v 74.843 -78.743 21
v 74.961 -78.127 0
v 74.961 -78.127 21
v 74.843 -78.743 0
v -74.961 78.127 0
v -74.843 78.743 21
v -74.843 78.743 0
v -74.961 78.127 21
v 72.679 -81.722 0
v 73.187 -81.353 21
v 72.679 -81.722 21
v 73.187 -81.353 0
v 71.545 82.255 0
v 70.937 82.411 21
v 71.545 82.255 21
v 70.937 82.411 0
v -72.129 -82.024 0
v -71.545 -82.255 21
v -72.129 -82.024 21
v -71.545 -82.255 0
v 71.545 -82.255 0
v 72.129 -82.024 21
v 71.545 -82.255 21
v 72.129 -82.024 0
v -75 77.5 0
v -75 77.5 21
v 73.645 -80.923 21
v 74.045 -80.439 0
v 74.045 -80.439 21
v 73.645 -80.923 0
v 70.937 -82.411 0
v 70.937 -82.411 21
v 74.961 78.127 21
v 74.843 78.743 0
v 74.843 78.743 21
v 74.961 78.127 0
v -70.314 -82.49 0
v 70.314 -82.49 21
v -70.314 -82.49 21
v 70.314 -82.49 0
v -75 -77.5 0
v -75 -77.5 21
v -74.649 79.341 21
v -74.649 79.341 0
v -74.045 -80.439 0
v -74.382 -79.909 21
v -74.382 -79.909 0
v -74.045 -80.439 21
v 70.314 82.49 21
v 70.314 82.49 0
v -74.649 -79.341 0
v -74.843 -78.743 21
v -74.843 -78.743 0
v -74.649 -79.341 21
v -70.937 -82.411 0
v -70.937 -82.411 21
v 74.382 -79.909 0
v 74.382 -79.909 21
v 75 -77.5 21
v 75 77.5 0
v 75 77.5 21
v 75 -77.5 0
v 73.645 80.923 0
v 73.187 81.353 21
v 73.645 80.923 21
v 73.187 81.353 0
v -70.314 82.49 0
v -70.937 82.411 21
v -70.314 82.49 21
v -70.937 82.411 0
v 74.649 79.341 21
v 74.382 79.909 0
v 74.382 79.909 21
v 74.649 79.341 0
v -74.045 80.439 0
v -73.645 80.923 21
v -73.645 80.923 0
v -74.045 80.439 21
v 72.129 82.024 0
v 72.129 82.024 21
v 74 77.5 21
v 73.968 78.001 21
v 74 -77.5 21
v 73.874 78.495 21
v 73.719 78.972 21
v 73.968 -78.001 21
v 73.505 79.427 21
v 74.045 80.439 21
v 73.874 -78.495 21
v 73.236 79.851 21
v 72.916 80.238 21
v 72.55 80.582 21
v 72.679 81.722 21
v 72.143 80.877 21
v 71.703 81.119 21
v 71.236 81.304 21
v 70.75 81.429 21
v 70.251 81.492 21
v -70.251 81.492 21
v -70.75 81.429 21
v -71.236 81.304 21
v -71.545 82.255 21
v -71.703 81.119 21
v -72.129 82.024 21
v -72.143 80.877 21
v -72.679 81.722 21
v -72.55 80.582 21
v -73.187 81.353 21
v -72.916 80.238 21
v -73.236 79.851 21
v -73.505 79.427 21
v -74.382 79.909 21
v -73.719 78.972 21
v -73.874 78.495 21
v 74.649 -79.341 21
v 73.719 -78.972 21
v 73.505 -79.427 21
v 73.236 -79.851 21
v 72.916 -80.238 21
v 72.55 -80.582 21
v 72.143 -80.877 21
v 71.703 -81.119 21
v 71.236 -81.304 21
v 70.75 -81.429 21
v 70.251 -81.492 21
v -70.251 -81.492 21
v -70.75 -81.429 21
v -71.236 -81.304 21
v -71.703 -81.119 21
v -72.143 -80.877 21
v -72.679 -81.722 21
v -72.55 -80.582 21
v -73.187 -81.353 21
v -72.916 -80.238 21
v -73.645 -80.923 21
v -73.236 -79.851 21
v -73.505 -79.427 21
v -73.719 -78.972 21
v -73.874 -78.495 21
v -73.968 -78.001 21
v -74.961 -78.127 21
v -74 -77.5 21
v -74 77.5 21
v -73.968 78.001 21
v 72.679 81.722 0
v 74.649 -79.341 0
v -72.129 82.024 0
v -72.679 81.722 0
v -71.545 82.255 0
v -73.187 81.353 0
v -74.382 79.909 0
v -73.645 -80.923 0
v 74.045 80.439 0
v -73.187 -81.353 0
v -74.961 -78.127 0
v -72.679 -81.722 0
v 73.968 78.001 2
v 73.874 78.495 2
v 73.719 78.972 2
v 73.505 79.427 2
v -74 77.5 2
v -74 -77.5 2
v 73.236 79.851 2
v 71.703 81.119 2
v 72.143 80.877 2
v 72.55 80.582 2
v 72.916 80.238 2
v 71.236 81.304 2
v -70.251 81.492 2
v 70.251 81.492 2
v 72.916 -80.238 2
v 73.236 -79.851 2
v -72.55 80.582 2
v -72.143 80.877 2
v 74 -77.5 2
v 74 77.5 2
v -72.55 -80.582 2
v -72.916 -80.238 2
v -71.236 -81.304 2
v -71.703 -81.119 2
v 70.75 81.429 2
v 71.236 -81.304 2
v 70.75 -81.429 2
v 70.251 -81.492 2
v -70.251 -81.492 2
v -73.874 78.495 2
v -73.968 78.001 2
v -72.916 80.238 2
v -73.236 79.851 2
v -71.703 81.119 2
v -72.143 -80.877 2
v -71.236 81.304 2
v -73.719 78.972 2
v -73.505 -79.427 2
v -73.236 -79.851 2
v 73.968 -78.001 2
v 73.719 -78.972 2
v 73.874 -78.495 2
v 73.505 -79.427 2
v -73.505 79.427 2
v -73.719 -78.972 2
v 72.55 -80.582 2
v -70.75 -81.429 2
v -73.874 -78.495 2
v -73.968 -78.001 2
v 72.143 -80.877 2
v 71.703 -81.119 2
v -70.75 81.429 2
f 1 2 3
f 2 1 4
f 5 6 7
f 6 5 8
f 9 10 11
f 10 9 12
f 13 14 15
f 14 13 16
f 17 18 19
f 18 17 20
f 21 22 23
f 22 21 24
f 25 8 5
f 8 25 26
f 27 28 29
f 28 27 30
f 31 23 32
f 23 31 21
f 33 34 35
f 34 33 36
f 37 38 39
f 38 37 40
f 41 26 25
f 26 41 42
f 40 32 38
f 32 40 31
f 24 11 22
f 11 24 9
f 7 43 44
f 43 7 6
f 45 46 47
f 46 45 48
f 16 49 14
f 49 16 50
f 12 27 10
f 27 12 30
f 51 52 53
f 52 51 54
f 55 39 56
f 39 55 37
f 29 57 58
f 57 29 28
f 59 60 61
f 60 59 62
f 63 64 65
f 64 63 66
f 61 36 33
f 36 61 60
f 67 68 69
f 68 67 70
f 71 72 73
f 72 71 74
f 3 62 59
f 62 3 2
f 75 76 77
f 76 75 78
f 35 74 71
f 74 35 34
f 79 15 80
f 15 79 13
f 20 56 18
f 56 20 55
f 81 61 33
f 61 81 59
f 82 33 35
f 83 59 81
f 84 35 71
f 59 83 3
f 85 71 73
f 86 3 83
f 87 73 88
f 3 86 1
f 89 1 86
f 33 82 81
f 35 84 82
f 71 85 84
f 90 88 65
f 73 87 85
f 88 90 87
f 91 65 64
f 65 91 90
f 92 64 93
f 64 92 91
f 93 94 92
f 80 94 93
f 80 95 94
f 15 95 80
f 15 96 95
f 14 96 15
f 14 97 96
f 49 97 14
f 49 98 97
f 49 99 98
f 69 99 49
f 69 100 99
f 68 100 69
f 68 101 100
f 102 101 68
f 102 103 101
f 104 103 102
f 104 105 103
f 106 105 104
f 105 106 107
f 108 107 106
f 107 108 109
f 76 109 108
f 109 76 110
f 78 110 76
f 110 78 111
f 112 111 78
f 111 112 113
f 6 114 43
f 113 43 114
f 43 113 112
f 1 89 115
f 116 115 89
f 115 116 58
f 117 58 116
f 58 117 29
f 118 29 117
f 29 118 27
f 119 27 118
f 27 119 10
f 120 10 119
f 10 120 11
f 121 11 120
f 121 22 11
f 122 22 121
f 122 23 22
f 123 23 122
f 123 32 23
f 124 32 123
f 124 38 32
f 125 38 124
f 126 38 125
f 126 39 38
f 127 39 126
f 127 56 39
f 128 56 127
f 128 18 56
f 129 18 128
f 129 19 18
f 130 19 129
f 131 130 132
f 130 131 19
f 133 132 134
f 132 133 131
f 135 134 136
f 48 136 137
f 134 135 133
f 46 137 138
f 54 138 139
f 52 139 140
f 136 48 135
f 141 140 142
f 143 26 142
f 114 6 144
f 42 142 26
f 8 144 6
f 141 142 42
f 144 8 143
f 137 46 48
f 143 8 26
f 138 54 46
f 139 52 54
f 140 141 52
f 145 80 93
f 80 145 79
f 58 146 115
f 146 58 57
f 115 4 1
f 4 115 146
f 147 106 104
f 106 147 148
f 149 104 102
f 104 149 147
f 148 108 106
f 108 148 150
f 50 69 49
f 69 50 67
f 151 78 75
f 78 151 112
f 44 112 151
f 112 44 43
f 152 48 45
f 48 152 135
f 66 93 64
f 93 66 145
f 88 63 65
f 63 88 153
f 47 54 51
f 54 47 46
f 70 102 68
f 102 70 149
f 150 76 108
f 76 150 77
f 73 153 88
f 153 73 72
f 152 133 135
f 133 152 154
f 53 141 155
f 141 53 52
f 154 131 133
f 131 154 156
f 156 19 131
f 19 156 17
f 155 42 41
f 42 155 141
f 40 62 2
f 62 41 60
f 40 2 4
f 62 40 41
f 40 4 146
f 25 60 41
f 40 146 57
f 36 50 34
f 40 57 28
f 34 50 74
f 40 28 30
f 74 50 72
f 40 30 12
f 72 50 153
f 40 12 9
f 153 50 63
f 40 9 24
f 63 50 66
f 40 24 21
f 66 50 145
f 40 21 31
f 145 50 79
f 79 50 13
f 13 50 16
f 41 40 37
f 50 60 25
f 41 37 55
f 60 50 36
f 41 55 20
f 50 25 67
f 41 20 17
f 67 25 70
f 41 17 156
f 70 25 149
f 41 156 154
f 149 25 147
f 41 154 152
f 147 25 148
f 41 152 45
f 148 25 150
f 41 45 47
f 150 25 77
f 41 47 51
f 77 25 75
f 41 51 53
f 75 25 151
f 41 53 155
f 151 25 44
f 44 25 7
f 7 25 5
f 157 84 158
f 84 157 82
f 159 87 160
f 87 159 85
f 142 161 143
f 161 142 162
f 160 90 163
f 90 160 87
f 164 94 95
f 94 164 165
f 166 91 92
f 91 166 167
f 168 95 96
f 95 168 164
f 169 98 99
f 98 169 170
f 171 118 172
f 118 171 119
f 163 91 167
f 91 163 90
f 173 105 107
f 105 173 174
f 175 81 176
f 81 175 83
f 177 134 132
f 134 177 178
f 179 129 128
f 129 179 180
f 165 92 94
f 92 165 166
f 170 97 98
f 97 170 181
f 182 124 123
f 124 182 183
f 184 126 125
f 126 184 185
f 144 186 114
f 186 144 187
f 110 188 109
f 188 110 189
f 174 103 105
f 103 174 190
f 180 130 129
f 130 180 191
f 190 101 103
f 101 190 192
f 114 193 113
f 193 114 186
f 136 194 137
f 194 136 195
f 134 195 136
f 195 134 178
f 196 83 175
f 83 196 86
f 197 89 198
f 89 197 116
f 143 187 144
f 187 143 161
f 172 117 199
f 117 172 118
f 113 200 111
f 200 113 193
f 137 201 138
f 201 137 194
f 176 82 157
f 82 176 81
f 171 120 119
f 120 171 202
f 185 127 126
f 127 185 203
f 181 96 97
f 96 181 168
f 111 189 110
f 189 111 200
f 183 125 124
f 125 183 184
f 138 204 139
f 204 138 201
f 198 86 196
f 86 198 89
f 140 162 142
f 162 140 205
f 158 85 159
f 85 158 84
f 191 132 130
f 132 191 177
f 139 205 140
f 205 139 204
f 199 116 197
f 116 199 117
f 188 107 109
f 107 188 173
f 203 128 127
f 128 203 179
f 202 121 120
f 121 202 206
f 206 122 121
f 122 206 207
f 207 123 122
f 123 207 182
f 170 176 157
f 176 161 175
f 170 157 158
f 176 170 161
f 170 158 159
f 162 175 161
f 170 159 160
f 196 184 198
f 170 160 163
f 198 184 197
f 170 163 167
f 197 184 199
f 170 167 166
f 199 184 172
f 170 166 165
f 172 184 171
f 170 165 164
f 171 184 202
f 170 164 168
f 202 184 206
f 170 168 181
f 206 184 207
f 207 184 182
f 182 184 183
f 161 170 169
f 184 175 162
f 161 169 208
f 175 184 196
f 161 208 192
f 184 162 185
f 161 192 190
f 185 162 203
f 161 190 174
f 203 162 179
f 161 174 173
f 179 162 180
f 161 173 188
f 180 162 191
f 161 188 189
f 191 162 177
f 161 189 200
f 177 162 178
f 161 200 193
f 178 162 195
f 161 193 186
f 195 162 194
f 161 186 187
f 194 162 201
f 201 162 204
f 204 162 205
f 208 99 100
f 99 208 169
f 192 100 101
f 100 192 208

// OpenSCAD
$fn = 50;


difference() {
	union() {
		hull() {
			translate(v = [-70.0000000000, 77.5000000000, 0]) {
				cylinder(h = 21, r = 5);
			}
			translate(v = [70.0000000000, 77.5000000000, 0]) {
				cylinder(h = 21, r = 5);
			}
			translate(v = [-70.0000000000, -77.5000000000, 0]) {
				cylinder(h = 21, r = 5);
			}
			translate(v = [70.0000000000, -77.5000000000, 0]) {
				cylinder(h = 21, r = 5);
			}
		}
	}
	union() {
		translate(v = [0, 0, 2]) {
			hull() {
				translate(v = [-70.0000000000, 77.5000000000, 0]) {
					cylinder(h = 19, r = 4);
				}
				translate(v = [70.0000000000, 77.5000000000, 0]) {
					cylinder(h = 19, r = 4);
				}
				translate(v = [-70.0000000000, -77.5000000000, 0]) {
					cylinder(h = 19, r = 4);
				}
				translate(v = [70.0000000000, -77.5000000000, 0]) {
					cylinder(h = 19, r = 4);
				}
			}
		}
	}
}
